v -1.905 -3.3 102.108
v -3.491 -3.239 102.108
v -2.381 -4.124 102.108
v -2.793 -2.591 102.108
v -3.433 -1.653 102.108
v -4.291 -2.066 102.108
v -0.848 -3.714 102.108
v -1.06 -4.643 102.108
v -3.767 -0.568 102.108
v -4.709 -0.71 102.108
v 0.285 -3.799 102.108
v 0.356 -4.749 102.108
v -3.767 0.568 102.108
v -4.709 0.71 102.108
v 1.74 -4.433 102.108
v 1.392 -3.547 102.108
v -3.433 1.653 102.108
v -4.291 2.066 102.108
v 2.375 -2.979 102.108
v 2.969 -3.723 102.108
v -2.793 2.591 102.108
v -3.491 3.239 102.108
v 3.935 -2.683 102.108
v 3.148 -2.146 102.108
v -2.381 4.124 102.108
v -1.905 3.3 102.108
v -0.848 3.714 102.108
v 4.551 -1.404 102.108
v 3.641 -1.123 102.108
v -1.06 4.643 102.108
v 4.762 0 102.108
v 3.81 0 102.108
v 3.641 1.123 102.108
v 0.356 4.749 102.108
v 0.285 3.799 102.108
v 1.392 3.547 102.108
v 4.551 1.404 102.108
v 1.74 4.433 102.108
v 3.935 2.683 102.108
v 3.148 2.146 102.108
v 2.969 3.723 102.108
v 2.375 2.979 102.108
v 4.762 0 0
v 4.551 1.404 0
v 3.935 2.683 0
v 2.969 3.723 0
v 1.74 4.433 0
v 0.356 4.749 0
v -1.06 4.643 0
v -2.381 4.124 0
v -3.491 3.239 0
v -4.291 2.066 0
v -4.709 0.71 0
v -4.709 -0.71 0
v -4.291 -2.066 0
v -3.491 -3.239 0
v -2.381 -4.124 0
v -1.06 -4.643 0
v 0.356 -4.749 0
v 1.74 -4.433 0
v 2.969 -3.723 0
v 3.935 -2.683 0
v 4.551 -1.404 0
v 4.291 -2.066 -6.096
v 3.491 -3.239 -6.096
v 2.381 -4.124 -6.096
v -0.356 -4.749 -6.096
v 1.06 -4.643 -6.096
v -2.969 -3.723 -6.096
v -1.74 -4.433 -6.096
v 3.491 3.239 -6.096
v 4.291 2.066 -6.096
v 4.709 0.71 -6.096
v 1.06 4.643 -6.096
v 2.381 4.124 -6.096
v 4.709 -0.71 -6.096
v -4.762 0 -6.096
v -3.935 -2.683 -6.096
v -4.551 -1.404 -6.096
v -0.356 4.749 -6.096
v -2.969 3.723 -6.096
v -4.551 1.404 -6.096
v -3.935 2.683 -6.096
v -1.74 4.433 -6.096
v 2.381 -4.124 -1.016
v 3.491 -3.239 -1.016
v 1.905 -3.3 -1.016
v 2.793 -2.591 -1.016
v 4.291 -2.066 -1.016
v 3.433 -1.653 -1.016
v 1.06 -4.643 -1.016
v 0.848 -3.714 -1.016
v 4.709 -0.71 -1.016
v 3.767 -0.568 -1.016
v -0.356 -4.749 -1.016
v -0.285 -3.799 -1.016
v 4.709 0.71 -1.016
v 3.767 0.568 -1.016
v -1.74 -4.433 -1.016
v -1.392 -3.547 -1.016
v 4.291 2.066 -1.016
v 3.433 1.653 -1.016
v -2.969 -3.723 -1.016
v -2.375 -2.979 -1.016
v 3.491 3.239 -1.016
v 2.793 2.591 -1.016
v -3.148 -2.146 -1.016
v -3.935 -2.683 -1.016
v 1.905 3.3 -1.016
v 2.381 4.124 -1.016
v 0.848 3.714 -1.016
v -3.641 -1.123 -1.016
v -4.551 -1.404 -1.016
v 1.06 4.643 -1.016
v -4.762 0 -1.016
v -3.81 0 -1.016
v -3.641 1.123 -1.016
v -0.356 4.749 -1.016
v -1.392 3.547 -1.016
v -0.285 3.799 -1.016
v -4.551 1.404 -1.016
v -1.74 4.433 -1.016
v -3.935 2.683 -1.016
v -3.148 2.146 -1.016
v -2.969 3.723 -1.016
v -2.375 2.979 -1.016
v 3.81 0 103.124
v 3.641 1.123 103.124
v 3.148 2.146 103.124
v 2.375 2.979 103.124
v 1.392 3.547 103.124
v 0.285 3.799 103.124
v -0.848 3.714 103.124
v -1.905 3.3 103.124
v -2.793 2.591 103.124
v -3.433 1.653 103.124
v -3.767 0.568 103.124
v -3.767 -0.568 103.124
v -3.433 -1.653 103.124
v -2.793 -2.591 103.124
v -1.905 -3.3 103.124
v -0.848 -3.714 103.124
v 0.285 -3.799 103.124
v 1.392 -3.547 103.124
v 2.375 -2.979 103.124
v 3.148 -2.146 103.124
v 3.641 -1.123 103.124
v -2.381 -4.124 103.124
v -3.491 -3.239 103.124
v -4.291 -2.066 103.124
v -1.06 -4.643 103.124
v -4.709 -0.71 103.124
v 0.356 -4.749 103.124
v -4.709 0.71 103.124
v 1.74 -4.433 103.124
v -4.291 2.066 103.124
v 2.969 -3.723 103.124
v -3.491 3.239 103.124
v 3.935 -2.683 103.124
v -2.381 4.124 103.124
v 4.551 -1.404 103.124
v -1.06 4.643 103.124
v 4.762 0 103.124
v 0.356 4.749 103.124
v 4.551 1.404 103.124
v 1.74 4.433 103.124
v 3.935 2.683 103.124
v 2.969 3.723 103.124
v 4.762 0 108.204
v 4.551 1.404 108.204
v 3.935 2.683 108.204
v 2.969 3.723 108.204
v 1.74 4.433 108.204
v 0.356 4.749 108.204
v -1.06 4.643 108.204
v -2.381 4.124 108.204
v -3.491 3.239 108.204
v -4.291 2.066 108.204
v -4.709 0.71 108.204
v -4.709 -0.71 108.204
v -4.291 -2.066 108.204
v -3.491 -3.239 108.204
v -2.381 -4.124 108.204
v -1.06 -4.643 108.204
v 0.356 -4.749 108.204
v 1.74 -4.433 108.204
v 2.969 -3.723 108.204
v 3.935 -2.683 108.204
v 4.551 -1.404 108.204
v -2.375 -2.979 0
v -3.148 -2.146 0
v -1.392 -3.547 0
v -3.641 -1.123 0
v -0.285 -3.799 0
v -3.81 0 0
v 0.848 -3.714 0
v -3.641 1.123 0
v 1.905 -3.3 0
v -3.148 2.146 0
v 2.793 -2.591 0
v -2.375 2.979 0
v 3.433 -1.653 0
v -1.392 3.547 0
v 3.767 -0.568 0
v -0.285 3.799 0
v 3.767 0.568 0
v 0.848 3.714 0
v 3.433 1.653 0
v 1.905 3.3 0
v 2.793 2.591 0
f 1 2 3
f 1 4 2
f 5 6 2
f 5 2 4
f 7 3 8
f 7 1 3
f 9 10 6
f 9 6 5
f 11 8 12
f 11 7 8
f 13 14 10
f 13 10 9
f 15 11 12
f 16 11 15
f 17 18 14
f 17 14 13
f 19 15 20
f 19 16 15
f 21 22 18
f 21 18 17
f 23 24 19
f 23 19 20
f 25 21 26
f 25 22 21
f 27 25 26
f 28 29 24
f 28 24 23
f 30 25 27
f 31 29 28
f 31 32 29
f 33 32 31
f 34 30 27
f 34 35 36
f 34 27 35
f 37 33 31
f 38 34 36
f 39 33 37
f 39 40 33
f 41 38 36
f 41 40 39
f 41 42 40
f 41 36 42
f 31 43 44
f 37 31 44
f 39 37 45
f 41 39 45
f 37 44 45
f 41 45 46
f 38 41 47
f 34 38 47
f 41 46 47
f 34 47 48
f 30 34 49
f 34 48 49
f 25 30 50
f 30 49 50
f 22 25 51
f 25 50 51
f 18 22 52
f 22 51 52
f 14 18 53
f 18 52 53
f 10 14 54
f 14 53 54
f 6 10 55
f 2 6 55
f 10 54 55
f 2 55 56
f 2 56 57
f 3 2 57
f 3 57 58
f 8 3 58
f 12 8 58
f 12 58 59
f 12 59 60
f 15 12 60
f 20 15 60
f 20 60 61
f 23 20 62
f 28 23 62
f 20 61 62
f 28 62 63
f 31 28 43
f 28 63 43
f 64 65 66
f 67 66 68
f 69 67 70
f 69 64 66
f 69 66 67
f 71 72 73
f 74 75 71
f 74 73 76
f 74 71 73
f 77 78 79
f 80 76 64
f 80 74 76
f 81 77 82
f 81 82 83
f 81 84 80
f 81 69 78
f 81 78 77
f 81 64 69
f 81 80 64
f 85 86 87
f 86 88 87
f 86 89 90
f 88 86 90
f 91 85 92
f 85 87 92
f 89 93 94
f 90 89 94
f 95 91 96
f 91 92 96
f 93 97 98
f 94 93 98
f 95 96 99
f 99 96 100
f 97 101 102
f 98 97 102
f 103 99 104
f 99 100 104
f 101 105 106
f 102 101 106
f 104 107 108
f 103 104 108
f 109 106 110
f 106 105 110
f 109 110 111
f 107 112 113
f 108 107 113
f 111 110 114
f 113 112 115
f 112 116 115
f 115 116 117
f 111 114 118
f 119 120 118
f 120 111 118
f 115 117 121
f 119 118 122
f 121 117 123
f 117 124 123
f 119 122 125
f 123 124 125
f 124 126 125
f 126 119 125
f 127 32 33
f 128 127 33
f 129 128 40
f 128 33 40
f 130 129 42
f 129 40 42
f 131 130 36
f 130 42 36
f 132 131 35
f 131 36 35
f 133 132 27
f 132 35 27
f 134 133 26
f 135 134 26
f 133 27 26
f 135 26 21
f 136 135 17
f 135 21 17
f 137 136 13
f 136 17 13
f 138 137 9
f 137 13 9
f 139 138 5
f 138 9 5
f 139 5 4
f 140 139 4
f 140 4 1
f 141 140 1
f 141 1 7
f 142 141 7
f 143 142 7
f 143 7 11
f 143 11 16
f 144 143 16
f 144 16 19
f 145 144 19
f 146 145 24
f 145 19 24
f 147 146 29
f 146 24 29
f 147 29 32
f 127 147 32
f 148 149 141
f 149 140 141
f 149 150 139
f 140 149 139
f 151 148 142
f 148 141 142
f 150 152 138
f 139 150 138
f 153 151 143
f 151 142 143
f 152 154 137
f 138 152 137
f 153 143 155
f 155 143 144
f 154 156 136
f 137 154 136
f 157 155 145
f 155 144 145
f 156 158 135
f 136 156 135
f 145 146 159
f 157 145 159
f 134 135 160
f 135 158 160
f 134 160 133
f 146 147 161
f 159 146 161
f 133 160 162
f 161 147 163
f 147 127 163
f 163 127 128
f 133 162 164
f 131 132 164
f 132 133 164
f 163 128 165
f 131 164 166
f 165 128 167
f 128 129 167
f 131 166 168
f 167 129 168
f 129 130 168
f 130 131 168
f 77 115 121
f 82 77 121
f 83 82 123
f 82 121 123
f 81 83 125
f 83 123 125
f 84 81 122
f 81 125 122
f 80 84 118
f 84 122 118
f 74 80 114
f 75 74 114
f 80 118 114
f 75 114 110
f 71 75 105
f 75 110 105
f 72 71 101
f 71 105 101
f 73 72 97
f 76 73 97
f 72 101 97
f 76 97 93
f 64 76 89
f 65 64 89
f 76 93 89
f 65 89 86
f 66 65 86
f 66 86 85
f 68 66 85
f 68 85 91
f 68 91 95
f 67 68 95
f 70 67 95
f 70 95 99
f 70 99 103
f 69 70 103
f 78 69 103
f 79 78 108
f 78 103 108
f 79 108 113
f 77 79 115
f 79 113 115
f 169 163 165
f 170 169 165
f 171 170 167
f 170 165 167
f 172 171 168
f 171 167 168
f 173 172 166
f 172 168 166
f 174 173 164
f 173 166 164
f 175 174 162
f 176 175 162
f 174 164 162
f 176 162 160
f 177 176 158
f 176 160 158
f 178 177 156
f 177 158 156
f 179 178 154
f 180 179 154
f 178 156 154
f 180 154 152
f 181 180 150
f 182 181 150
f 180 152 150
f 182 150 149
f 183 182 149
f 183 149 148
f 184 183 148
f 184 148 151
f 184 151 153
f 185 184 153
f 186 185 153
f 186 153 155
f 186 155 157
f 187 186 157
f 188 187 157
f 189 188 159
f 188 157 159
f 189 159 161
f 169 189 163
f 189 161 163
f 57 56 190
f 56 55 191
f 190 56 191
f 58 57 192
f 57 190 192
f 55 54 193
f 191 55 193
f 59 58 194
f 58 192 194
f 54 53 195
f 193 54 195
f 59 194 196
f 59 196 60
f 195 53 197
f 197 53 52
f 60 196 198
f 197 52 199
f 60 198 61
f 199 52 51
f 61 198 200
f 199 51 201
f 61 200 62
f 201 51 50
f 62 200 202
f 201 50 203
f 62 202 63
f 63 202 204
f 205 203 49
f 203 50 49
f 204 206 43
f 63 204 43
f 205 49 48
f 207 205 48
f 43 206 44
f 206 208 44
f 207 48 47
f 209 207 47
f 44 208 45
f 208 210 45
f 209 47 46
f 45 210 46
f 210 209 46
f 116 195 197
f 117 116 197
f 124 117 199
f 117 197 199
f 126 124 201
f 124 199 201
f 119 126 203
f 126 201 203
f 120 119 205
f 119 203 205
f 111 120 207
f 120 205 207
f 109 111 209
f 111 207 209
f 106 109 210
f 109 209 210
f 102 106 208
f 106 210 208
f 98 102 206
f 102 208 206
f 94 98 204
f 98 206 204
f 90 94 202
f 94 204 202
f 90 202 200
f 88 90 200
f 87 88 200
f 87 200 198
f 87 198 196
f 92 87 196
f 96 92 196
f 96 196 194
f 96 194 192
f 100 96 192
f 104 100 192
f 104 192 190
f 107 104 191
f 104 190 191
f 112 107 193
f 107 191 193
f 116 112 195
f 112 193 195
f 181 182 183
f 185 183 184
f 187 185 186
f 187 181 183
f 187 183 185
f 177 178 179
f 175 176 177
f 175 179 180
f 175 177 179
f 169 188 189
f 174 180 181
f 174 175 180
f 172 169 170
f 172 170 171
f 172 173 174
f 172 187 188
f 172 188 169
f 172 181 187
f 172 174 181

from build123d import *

# Parameters (mm, degrees)
SKETCH1_R           = 4.7625
BOSS_EXTRUDE1_DEPTH = 102.108
SKETCH2_R           = 3.81
BOSS_EXTRUDE2_DEPTH = 1.016
SKETCH3_R           = 4.7625
BOSS_EXTRUDE3_DEPTH = 5.08
SKETCH4_R           = 3.81
BOSS_EXTRUDE4_DEPTH = 1.016
SKETCH5_R           = 4.7625
BOSS_EXTRUDE5_DEPTH = 5.08


with BuildPart() as part:
    # Sketch1 → Boss-Extrude1 (new body)
    with BuildSketch(Plane.XY):
        Circle(SKETCH1_R)
    extrude(amount=BOSS_EXTRUDE1_DEPTH)

    # Sketch2 → Boss-Extrude2 (add)
    with BuildSketch(Plane(origin=(0, 0, 0), x_dir=(-1, 0, 0), z_dir=(0, 0, -1))):
        Circle(SKETCH2_R)
    extrude(amount=BOSS_EXTRUDE2_DEPTH)

    # Sketch3 → Boss-Extrude3 (add)
    with BuildSketch(Plane(origin=(0, 0, -1.016), x_dir=(-1, 0, 0), z_dir=(0, 0, -1))):
        Circle(SKETCH3_R)
    extrude(amount=BOSS_EXTRUDE3_DEPTH)

    # Sketch4 → Boss-Extrude4 (add)
    with BuildSketch(Plane.XY.offset(102.108)):
        Circle(SKETCH4_R)
    extrude(amount=BOSS_EXTRUDE4_DEPTH)

    # Sketch5 → Boss-Extrude5 (add)
    with BuildSketch(Plane.XY.offset(103.124)):
        Circle(SKETCH5_R)
    extrude(amount=BOSS_EXTRUDE5_DEPTH)


solid = part.part
